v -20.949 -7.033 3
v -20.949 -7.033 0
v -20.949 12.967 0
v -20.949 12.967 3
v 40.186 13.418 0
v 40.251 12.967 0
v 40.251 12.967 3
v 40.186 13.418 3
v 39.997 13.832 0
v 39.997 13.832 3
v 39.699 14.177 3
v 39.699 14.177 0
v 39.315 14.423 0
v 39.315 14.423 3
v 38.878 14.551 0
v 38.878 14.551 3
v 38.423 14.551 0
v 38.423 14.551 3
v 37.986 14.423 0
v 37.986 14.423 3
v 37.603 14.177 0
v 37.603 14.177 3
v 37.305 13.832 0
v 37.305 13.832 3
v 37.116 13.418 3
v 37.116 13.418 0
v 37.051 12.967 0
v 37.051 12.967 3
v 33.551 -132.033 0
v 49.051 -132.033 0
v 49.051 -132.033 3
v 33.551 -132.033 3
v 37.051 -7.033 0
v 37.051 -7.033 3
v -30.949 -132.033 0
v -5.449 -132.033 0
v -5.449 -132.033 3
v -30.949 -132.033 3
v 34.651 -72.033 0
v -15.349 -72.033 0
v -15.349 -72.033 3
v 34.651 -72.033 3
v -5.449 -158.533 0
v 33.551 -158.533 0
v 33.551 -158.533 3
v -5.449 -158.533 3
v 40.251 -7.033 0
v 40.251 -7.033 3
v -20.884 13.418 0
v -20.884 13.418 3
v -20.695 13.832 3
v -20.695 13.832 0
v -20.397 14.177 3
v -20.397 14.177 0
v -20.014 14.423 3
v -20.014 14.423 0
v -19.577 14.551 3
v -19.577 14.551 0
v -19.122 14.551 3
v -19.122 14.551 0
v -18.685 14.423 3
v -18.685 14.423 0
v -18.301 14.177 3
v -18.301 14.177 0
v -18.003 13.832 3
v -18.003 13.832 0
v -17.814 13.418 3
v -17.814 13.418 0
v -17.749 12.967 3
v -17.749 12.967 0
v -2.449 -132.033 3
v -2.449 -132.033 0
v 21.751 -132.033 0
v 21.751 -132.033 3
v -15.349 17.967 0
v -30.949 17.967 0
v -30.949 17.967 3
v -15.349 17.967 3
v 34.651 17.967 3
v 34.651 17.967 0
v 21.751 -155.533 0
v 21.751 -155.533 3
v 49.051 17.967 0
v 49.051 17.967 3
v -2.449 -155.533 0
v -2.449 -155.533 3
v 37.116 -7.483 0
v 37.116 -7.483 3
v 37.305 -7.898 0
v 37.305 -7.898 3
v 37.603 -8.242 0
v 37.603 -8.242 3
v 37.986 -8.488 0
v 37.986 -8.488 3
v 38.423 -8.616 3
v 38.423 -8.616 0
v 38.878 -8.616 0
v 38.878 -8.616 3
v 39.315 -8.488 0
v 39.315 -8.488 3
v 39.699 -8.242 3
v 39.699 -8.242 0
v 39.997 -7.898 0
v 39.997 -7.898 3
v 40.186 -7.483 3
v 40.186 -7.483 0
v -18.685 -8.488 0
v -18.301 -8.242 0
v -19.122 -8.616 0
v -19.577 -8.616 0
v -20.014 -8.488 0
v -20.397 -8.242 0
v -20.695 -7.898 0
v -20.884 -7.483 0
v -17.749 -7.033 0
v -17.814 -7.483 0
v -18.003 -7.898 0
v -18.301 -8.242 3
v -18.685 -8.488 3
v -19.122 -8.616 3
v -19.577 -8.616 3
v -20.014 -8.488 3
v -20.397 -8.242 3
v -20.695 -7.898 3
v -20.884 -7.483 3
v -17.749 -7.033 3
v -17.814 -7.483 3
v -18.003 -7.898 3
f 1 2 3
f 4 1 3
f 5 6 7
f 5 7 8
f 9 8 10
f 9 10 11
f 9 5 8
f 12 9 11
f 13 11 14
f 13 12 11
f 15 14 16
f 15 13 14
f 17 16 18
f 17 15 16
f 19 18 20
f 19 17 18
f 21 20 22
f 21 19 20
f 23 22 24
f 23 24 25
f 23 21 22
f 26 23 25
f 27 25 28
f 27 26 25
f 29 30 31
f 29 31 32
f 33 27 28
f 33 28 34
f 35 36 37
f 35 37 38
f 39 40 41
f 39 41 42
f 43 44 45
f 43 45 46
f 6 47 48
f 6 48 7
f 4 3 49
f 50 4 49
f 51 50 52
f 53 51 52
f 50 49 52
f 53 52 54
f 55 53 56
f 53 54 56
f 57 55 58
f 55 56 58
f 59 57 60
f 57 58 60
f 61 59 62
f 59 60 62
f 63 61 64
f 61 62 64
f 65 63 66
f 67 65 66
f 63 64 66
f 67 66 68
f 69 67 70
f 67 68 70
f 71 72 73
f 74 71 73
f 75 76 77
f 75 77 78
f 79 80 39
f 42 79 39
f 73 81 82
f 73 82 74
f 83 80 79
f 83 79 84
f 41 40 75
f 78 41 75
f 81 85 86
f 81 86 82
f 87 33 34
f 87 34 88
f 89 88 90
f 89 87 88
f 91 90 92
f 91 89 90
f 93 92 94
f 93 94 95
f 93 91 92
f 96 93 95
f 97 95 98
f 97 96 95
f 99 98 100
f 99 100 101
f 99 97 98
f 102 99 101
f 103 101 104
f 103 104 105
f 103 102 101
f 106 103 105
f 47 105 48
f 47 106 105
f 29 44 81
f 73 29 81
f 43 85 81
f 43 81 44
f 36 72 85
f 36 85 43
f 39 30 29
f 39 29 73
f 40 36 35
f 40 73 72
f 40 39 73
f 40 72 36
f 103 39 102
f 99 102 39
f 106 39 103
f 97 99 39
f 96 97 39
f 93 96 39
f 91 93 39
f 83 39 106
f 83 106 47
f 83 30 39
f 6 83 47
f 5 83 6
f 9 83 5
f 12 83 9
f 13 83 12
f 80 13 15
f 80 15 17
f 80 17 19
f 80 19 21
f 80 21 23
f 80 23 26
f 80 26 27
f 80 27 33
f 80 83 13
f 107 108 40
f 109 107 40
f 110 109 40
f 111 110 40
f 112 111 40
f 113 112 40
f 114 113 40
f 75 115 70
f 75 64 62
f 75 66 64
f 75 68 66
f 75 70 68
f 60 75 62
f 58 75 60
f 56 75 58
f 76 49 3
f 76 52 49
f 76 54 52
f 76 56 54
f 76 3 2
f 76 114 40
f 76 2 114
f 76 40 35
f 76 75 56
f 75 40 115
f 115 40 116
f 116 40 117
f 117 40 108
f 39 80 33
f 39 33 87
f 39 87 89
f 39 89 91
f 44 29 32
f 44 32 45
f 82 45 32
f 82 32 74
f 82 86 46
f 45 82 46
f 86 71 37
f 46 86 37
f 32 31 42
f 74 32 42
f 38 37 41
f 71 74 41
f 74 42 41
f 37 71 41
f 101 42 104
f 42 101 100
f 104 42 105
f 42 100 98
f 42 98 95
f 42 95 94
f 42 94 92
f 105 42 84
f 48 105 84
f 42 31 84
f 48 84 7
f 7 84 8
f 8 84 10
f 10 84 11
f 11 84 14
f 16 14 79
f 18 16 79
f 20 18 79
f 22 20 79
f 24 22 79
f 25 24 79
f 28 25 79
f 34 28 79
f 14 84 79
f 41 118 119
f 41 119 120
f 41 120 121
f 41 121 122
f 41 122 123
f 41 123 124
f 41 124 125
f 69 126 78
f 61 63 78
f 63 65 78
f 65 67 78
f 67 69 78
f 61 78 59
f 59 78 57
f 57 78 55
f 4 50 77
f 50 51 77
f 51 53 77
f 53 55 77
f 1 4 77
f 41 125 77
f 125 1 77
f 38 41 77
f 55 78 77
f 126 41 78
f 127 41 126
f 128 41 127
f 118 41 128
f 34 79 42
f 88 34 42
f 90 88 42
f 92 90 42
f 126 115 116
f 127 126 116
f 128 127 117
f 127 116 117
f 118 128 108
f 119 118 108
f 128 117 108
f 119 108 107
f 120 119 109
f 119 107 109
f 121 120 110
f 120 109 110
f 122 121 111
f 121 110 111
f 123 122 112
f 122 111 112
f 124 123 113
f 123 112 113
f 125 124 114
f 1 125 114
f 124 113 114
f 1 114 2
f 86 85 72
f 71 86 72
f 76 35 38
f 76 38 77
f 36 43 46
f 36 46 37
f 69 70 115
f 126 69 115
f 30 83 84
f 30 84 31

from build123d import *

# Parameters (mm, degrees)
SKETCH_1_W      = 24.2
SKETCH_1_H      = 23.5
EXTRUDE_1_DEPTH = 3


with BuildPart() as part:
    # 草图1 → 凸台-拉伸1 (new body)
    with BuildSketch(Plane.XY):
        Polygon((-30.949264706, 17.967420182), (-15.349264706, 17.967420182), (-15.349264706, -8.713823312), (-15.349264706, -72.032579818), (34.650735294, -72.032579818), (34.650735294, -8.713823312), (34.650735294, 17.967420182), (49.050735294, 17.967420182), (49.050735294, -132.032579818), (33.550735294, -132.032579818), (33.550735294, -158.532579818), (-5.449264706, -158.532579818), (-5.449264706, -132.032579818), (-30.949264706, -132.032579818), align=None)
        with BuildLine():
            Line((-17.749264706, 12.967420182), (-17.749264706, -7.032579818))
            ThreePointArc((-17.749264706, -7.032579818), (-19.349264706, -8.632579818), (-20.949264706, -7.032579818))
            Line((-20.949264706, -7.032579818), (-20.949264706, 12.967420182))
            ThreePointArc((-20.949264706, 12.967420182), (-19.349264706, 14.567420182), (-17.749264706, 12.967420182))
        make_face(mode=Mode.SUBTRACT)
        with BuildLine():
            Line((37.050735294, 12.967420182), (37.050735294, -7.032579818))
            ThreePointArc((37.050735294, -7.032579818), (38.650735294, -8.632579818), (40.250735294, -7.032579818))
            Line((40.250735294, -7.032579818), (40.250735294, 12.967420182))
            ThreePointArc((40.250735294, 12.967420182), (38.650735294, 14.567420182), (37.050735294, 12.967420182))
        make_face(mode=Mode.SUBTRACT)
        with Locations((9.650735294, -143.782579818)):
            Rectangle(SKETCH_1_W, SKETCH_1_H, mode=Mode.SUBTRACT)
    extrude(amount=EXTRUDE_1_DEPTH)


solid = part.part
